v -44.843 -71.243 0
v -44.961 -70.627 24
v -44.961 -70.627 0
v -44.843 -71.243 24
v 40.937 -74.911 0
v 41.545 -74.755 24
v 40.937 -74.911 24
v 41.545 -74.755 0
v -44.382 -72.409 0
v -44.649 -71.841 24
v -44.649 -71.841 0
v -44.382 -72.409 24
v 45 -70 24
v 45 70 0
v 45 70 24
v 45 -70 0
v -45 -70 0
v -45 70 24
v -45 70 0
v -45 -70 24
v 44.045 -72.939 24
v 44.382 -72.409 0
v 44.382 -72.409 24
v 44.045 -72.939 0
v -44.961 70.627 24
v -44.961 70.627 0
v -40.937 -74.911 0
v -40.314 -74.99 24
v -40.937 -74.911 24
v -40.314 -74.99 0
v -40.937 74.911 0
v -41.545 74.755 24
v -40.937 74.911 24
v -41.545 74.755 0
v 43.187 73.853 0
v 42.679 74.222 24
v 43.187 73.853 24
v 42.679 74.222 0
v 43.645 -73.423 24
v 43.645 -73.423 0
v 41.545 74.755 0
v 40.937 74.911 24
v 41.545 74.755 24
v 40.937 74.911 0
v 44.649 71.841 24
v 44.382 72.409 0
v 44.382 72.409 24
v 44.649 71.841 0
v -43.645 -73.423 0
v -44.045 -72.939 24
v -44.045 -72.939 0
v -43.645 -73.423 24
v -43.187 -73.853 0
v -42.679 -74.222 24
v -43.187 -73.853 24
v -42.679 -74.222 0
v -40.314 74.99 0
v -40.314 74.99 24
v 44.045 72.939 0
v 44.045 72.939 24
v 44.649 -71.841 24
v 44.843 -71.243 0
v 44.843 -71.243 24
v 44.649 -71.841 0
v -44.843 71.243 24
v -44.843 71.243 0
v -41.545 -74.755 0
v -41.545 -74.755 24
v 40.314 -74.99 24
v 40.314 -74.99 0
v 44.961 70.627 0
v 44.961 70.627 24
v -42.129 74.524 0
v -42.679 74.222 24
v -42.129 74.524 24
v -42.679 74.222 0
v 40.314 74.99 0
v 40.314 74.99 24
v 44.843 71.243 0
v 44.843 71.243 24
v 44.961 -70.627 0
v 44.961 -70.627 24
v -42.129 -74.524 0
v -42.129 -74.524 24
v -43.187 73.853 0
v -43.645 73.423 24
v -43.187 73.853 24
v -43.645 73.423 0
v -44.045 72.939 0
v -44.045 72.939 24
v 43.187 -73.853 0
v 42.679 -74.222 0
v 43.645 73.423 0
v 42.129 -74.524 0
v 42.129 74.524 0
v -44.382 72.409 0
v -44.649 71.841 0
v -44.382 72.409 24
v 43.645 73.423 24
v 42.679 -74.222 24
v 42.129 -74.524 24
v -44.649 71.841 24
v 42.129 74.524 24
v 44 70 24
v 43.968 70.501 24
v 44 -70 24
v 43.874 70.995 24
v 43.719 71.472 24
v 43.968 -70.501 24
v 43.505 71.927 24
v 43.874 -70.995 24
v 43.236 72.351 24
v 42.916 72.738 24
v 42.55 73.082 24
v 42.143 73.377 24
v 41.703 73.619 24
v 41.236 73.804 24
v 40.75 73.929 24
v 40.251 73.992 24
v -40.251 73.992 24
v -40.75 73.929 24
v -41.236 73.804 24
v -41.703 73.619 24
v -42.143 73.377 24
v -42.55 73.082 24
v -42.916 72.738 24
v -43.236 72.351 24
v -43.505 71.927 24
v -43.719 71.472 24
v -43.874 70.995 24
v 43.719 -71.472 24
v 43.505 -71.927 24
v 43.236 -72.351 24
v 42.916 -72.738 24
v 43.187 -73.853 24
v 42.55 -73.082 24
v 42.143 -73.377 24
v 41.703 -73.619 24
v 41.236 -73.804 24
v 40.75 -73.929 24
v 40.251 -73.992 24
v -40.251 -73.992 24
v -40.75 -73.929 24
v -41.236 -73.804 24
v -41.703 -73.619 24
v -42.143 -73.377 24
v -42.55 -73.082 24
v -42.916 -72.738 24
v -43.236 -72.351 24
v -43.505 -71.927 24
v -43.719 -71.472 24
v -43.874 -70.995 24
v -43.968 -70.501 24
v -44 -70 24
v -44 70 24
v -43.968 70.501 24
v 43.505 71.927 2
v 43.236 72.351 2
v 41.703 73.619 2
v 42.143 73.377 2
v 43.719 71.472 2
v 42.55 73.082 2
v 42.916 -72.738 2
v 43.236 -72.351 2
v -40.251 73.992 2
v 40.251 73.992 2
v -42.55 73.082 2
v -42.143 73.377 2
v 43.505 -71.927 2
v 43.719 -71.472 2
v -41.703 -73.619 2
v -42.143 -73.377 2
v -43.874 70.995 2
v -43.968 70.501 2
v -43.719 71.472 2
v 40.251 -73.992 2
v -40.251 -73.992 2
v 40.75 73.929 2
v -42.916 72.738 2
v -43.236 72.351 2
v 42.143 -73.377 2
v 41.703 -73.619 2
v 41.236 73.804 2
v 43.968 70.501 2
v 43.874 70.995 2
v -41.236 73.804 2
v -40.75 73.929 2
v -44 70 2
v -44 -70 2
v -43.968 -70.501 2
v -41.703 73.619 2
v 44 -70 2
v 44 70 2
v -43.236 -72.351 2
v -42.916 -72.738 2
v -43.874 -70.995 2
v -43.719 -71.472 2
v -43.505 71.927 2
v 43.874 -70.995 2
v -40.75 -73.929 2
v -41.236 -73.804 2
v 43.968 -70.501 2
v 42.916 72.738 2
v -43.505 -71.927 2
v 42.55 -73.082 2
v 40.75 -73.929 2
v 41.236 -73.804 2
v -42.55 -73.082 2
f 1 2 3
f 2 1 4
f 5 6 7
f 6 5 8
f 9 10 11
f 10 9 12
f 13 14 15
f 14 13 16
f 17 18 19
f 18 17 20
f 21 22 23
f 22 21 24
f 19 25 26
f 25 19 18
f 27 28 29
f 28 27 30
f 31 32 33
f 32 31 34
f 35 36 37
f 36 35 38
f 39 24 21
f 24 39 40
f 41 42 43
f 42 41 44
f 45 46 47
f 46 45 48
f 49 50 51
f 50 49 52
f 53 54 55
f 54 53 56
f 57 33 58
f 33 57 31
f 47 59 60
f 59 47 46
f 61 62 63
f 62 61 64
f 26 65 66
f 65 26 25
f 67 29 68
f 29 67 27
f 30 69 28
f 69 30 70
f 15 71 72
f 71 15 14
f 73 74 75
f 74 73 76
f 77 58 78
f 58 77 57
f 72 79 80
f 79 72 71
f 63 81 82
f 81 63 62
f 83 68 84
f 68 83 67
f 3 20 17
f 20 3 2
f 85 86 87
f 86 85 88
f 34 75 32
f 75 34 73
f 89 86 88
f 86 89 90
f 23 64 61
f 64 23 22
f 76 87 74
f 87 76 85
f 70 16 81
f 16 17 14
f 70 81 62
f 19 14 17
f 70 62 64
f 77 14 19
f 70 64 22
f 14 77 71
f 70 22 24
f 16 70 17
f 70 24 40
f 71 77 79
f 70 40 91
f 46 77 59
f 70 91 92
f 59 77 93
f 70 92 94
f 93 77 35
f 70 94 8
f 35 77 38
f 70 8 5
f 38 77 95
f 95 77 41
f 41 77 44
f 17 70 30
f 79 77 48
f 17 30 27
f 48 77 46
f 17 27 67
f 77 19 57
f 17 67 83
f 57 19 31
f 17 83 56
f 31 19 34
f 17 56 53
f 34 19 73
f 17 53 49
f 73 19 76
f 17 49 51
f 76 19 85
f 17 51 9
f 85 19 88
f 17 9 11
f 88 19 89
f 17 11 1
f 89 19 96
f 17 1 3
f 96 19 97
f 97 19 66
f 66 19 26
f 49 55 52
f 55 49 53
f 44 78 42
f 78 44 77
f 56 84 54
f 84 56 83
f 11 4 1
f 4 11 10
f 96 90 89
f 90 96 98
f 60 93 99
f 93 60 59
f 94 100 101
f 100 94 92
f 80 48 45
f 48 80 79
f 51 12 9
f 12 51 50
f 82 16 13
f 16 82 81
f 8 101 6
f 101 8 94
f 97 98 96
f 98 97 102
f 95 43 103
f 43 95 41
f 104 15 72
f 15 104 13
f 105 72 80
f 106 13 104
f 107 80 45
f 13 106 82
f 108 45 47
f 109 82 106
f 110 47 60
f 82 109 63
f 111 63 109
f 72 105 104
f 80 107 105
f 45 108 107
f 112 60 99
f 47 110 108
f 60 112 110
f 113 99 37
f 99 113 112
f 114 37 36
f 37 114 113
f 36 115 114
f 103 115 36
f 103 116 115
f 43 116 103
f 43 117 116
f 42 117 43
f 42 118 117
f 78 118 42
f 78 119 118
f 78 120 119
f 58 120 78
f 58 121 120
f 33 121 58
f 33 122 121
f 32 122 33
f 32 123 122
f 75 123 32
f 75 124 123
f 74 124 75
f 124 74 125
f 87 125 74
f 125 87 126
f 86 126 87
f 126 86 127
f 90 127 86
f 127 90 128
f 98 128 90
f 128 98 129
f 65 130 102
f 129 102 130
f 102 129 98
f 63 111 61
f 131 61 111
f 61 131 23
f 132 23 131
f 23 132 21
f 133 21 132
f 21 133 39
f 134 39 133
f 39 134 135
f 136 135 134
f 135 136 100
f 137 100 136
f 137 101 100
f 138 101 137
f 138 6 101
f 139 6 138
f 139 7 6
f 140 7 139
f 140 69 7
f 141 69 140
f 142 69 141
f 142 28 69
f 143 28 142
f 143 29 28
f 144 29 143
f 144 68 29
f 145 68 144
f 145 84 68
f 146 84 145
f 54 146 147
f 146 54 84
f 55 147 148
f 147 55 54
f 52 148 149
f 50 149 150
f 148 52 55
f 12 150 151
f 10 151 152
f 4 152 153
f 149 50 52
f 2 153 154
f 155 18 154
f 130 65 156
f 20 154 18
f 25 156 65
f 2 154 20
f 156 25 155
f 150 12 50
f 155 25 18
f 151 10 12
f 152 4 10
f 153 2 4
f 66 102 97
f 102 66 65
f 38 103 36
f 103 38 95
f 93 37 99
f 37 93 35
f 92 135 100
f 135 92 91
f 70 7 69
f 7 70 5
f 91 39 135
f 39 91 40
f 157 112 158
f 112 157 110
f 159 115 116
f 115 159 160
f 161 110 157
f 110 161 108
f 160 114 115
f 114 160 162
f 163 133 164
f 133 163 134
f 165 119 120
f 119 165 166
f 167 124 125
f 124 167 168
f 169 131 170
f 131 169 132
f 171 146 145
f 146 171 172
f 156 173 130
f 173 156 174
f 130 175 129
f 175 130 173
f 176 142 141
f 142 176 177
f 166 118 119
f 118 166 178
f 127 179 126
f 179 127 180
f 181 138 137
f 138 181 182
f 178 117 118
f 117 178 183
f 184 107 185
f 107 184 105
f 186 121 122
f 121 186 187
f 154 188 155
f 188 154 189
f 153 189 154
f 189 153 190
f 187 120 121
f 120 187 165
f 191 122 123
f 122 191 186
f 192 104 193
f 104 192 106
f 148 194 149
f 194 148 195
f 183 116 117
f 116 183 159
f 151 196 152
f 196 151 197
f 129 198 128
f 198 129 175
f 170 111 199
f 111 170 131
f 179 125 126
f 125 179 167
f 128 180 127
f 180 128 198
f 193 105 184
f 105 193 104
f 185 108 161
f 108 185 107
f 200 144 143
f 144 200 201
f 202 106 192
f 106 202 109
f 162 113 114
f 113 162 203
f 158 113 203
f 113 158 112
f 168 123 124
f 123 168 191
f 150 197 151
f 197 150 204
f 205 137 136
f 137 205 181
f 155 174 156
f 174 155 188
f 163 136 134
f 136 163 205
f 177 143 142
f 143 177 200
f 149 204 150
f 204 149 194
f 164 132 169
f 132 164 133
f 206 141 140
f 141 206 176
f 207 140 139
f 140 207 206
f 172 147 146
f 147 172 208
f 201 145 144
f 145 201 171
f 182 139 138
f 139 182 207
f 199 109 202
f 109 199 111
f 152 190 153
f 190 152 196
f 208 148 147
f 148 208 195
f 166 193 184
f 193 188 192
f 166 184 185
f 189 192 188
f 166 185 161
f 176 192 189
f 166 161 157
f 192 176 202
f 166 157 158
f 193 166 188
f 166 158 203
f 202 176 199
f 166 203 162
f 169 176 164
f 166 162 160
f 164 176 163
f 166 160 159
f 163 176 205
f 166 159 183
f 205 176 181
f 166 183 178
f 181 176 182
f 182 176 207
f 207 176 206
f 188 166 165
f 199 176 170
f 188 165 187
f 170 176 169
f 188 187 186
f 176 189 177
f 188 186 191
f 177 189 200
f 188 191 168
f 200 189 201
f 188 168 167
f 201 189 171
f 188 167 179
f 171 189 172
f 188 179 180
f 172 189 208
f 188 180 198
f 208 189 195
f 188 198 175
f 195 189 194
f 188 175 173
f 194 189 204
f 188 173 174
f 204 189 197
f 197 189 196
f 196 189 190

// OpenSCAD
$fn = 50;


difference() {
	union() {
		hull() {
			translate(v = [-40.0000000000, 70.0000000000, 0]) {
				cylinder(h = 24, r = 5);
			}
			translate(v = [40.0000000000, 70.0000000000, 0]) {
				cylinder(h = 24, r = 5);
			}
			translate(v = [-40.0000000000, -70.0000000000, 0]) {
				cylinder(h = 24, r = 5);
			}
			translate(v = [40.0000000000, -70.0000000000, 0]) {
				cylinder(h = 24, r = 5);
			}
		}
	}
	union() {
		translate(v = [0, 0, 2]) {
			hull() {
				translate(v = [-40.0000000000, 70.0000000000, 0]) {
					cylinder(h = 22, r = 4);
				}
				translate(v = [40.0000000000, 70.0000000000, 0]) {
					cylinder(h = 22, r = 4);
				}
				translate(v = [-40.0000000000, -70.0000000000, 0]) {
					cylinder(h = 22, r = 4);
				}
				translate(v = [40.0000000000, -70.0000000000, 0]) {
					cylinder(h = 22, r = 4);
				}
			}
		}
	}
}
